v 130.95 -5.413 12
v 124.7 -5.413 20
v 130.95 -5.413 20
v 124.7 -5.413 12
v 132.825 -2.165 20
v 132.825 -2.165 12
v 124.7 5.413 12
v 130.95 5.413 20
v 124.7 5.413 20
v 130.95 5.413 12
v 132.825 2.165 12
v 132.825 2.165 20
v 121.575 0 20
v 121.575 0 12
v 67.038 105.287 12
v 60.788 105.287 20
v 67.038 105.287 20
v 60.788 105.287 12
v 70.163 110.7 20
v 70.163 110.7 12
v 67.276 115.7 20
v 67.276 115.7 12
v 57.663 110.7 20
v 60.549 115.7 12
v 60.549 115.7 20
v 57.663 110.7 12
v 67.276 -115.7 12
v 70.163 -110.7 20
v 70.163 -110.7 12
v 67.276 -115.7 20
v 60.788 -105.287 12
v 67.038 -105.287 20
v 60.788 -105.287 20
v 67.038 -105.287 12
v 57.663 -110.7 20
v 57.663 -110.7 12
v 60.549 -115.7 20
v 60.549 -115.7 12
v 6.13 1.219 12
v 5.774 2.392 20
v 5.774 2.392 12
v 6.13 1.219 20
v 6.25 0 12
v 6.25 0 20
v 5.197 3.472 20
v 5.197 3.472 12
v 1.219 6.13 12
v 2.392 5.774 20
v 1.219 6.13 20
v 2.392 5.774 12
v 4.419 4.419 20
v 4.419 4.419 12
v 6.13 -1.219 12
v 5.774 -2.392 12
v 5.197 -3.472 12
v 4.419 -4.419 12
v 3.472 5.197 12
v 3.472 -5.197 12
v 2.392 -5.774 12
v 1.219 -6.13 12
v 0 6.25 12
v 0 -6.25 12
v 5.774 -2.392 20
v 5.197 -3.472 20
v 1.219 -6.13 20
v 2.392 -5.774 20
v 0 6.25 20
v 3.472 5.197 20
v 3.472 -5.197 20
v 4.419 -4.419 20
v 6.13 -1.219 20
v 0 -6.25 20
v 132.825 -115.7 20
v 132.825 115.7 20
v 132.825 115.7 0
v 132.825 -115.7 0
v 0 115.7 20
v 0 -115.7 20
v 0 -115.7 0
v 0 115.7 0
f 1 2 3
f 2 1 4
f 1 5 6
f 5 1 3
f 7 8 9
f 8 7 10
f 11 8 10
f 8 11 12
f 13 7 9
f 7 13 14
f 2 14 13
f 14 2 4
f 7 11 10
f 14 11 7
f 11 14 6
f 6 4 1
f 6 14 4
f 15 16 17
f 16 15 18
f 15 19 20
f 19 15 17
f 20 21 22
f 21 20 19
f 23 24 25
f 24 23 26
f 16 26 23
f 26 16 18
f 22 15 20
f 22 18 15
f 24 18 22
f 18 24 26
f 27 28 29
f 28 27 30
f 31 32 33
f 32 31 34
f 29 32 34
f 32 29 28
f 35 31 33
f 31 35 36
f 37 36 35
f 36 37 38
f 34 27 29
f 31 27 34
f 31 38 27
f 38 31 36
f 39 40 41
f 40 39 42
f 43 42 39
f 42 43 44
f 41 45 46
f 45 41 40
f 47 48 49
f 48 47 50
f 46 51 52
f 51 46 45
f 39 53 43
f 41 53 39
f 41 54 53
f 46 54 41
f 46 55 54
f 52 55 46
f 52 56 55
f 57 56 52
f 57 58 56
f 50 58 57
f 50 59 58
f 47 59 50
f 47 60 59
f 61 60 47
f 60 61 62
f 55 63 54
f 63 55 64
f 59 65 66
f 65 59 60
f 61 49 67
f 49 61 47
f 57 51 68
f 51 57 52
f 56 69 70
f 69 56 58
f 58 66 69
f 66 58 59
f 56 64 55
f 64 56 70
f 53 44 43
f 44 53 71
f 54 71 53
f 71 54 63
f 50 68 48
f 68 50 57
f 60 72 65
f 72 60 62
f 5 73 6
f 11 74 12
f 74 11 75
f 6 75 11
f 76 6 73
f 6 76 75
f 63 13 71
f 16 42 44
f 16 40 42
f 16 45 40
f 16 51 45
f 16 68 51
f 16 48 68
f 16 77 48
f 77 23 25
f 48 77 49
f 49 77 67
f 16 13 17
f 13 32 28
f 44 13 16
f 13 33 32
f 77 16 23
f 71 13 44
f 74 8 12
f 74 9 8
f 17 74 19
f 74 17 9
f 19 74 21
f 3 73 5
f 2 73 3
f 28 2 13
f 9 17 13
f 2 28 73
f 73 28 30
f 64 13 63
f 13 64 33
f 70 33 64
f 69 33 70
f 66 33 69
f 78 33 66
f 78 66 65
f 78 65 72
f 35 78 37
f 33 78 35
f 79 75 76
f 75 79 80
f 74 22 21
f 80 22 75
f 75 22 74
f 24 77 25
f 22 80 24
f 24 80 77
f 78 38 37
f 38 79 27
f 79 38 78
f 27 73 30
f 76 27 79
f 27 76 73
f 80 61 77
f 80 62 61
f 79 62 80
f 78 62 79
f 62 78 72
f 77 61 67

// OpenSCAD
// HexTrack Gluing Jig for N-Scale Single Tile Module
// This jig helps align and hold the two split halves while gluing

/* [Dimensions] */
hex_flat_to_flat = 246; // [200:260] Based on Hex-Trak standard
plate_thickness = 4; // [2:10]
feet_height = 8; // [5:15]
feet_diameter = 12; // [8:20]
feet_inset = 0.1; // [0:0.5] Fraction to move feet inward from the vertices toward the center
center_foot_diameter = 12; // [8:20]
include_center_foot = true; // [false, true]

/* [Jig Settings] */
jig_thickness = 20; // [10:30] Increased thickness for stability
jig_margin = 5; // [0:20] Margin around the foot holes for the jig base
hole_depth = 8; // [5:15] Depth of the foot holes in the jig
hole_tolerance = 0.5; // [0.1:1] Clearance around foot holes (0.1=tight, 0.5=loose, easiest removal)
jig_part = 1; // [0:Full,1:RightHalfJig,2:LeftHalfJig]

// Calculated values
// For a regular hexagon: flat-to-flat = sqrt(3) * circumradius.
hex_radius = hex_flat_to_flat / sqrt(3);
hex_points = [for (i = [0:5]) [hex_radius * cos(60 * i), hex_radius * sin(60 * i)]];

// Foot positions (moved inward)
foot_positions = [for (p = hex_points) p * (1 - feet_inset)];

// Foot hole selection (turn on/off to choose which feet align in jig)
use_foot0 = true; // Right
use_foot1 = true; // Upper-right
use_foot2 = true; // Upper-left
use_foot3 = true; // Left
use_foot4 = true; // Lower-left
use_foot5 = true; // Lower-right

// Build the selected foot positions from the boolean toggles
jig_foot_positions = [
    for (i = [0:5])
        if ([use_foot0, use_foot1, use_foot2, use_foot3, use_foot4, use_foot5][i])
            foot_positions[i]
];

all_hole_positions = include_center_foot
    ? concat(jig_foot_positions, [[0, 0]])
    : jig_foot_positions;

module jig_base() {
    // Base sized only around the selected foot holes (smallest possible)
    x_coords = [for (p = all_hole_positions) p[0]];
    y_coords = [for (p = all_hole_positions) p[1]];
    x_min = min(x_coords);
    x_max = max(x_coords);
    y_min = min(y_coords);
    y_max = max(y_coords);

    translate([x_min - jig_margin, y_min - jig_margin, 0])
        cube([x_max - x_min + jig_margin*2, y_max - y_min + jig_margin*2, jig_thickness]);
}

module foot_holes() {
    for (pos = jig_foot_positions) {
        translate([pos[0], pos[1], jig_thickness - hole_depth])
            cylinder(d = feet_diameter + hole_tolerance, h = hole_depth + 0.1, $fn = 6); // Tolerance for easy fit
    }
    if (include_center_foot)
        translate([0, 0, jig_thickness - hole_depth])
            cylinder(d = center_foot_diameter + hole_tolerance, h = hole_depth + 0.1, $fn = 32);
}

module part_keep_cut() {
    // Keep only one side so each jig piece can fit smaller print beds.
    if (jig_part == 1) { // Right half
        translate([0, -hex_flat_to_flat * 2, -1])
            cube([hex_flat_to_flat * 2, hex_flat_to_flat * 4, jig_thickness + 2]);
    } else if (jig_part == 2) { // Left half
        translate([-hex_flat_to_flat * 2, -hex_flat_to_flat * 2, -1])
            cube([hex_flat_to_flat * 2, hex_flat_to_flat * 4, jig_thickness + 2]);
    } else { // Full
        translate([-hex_flat_to_flat * 2, -hex_flat_to_flat * 2, -1])
            cube([hex_flat_to_flat * 4, hex_flat_to_flat * 4, jig_thickness + 2]);
    }
}

// Assemble the jig (optionally as one half so no jig gluing is required).
intersection() {
    difference() {
        jig_base();
        foot_holes();
    }
    part_keep_cut();
}
